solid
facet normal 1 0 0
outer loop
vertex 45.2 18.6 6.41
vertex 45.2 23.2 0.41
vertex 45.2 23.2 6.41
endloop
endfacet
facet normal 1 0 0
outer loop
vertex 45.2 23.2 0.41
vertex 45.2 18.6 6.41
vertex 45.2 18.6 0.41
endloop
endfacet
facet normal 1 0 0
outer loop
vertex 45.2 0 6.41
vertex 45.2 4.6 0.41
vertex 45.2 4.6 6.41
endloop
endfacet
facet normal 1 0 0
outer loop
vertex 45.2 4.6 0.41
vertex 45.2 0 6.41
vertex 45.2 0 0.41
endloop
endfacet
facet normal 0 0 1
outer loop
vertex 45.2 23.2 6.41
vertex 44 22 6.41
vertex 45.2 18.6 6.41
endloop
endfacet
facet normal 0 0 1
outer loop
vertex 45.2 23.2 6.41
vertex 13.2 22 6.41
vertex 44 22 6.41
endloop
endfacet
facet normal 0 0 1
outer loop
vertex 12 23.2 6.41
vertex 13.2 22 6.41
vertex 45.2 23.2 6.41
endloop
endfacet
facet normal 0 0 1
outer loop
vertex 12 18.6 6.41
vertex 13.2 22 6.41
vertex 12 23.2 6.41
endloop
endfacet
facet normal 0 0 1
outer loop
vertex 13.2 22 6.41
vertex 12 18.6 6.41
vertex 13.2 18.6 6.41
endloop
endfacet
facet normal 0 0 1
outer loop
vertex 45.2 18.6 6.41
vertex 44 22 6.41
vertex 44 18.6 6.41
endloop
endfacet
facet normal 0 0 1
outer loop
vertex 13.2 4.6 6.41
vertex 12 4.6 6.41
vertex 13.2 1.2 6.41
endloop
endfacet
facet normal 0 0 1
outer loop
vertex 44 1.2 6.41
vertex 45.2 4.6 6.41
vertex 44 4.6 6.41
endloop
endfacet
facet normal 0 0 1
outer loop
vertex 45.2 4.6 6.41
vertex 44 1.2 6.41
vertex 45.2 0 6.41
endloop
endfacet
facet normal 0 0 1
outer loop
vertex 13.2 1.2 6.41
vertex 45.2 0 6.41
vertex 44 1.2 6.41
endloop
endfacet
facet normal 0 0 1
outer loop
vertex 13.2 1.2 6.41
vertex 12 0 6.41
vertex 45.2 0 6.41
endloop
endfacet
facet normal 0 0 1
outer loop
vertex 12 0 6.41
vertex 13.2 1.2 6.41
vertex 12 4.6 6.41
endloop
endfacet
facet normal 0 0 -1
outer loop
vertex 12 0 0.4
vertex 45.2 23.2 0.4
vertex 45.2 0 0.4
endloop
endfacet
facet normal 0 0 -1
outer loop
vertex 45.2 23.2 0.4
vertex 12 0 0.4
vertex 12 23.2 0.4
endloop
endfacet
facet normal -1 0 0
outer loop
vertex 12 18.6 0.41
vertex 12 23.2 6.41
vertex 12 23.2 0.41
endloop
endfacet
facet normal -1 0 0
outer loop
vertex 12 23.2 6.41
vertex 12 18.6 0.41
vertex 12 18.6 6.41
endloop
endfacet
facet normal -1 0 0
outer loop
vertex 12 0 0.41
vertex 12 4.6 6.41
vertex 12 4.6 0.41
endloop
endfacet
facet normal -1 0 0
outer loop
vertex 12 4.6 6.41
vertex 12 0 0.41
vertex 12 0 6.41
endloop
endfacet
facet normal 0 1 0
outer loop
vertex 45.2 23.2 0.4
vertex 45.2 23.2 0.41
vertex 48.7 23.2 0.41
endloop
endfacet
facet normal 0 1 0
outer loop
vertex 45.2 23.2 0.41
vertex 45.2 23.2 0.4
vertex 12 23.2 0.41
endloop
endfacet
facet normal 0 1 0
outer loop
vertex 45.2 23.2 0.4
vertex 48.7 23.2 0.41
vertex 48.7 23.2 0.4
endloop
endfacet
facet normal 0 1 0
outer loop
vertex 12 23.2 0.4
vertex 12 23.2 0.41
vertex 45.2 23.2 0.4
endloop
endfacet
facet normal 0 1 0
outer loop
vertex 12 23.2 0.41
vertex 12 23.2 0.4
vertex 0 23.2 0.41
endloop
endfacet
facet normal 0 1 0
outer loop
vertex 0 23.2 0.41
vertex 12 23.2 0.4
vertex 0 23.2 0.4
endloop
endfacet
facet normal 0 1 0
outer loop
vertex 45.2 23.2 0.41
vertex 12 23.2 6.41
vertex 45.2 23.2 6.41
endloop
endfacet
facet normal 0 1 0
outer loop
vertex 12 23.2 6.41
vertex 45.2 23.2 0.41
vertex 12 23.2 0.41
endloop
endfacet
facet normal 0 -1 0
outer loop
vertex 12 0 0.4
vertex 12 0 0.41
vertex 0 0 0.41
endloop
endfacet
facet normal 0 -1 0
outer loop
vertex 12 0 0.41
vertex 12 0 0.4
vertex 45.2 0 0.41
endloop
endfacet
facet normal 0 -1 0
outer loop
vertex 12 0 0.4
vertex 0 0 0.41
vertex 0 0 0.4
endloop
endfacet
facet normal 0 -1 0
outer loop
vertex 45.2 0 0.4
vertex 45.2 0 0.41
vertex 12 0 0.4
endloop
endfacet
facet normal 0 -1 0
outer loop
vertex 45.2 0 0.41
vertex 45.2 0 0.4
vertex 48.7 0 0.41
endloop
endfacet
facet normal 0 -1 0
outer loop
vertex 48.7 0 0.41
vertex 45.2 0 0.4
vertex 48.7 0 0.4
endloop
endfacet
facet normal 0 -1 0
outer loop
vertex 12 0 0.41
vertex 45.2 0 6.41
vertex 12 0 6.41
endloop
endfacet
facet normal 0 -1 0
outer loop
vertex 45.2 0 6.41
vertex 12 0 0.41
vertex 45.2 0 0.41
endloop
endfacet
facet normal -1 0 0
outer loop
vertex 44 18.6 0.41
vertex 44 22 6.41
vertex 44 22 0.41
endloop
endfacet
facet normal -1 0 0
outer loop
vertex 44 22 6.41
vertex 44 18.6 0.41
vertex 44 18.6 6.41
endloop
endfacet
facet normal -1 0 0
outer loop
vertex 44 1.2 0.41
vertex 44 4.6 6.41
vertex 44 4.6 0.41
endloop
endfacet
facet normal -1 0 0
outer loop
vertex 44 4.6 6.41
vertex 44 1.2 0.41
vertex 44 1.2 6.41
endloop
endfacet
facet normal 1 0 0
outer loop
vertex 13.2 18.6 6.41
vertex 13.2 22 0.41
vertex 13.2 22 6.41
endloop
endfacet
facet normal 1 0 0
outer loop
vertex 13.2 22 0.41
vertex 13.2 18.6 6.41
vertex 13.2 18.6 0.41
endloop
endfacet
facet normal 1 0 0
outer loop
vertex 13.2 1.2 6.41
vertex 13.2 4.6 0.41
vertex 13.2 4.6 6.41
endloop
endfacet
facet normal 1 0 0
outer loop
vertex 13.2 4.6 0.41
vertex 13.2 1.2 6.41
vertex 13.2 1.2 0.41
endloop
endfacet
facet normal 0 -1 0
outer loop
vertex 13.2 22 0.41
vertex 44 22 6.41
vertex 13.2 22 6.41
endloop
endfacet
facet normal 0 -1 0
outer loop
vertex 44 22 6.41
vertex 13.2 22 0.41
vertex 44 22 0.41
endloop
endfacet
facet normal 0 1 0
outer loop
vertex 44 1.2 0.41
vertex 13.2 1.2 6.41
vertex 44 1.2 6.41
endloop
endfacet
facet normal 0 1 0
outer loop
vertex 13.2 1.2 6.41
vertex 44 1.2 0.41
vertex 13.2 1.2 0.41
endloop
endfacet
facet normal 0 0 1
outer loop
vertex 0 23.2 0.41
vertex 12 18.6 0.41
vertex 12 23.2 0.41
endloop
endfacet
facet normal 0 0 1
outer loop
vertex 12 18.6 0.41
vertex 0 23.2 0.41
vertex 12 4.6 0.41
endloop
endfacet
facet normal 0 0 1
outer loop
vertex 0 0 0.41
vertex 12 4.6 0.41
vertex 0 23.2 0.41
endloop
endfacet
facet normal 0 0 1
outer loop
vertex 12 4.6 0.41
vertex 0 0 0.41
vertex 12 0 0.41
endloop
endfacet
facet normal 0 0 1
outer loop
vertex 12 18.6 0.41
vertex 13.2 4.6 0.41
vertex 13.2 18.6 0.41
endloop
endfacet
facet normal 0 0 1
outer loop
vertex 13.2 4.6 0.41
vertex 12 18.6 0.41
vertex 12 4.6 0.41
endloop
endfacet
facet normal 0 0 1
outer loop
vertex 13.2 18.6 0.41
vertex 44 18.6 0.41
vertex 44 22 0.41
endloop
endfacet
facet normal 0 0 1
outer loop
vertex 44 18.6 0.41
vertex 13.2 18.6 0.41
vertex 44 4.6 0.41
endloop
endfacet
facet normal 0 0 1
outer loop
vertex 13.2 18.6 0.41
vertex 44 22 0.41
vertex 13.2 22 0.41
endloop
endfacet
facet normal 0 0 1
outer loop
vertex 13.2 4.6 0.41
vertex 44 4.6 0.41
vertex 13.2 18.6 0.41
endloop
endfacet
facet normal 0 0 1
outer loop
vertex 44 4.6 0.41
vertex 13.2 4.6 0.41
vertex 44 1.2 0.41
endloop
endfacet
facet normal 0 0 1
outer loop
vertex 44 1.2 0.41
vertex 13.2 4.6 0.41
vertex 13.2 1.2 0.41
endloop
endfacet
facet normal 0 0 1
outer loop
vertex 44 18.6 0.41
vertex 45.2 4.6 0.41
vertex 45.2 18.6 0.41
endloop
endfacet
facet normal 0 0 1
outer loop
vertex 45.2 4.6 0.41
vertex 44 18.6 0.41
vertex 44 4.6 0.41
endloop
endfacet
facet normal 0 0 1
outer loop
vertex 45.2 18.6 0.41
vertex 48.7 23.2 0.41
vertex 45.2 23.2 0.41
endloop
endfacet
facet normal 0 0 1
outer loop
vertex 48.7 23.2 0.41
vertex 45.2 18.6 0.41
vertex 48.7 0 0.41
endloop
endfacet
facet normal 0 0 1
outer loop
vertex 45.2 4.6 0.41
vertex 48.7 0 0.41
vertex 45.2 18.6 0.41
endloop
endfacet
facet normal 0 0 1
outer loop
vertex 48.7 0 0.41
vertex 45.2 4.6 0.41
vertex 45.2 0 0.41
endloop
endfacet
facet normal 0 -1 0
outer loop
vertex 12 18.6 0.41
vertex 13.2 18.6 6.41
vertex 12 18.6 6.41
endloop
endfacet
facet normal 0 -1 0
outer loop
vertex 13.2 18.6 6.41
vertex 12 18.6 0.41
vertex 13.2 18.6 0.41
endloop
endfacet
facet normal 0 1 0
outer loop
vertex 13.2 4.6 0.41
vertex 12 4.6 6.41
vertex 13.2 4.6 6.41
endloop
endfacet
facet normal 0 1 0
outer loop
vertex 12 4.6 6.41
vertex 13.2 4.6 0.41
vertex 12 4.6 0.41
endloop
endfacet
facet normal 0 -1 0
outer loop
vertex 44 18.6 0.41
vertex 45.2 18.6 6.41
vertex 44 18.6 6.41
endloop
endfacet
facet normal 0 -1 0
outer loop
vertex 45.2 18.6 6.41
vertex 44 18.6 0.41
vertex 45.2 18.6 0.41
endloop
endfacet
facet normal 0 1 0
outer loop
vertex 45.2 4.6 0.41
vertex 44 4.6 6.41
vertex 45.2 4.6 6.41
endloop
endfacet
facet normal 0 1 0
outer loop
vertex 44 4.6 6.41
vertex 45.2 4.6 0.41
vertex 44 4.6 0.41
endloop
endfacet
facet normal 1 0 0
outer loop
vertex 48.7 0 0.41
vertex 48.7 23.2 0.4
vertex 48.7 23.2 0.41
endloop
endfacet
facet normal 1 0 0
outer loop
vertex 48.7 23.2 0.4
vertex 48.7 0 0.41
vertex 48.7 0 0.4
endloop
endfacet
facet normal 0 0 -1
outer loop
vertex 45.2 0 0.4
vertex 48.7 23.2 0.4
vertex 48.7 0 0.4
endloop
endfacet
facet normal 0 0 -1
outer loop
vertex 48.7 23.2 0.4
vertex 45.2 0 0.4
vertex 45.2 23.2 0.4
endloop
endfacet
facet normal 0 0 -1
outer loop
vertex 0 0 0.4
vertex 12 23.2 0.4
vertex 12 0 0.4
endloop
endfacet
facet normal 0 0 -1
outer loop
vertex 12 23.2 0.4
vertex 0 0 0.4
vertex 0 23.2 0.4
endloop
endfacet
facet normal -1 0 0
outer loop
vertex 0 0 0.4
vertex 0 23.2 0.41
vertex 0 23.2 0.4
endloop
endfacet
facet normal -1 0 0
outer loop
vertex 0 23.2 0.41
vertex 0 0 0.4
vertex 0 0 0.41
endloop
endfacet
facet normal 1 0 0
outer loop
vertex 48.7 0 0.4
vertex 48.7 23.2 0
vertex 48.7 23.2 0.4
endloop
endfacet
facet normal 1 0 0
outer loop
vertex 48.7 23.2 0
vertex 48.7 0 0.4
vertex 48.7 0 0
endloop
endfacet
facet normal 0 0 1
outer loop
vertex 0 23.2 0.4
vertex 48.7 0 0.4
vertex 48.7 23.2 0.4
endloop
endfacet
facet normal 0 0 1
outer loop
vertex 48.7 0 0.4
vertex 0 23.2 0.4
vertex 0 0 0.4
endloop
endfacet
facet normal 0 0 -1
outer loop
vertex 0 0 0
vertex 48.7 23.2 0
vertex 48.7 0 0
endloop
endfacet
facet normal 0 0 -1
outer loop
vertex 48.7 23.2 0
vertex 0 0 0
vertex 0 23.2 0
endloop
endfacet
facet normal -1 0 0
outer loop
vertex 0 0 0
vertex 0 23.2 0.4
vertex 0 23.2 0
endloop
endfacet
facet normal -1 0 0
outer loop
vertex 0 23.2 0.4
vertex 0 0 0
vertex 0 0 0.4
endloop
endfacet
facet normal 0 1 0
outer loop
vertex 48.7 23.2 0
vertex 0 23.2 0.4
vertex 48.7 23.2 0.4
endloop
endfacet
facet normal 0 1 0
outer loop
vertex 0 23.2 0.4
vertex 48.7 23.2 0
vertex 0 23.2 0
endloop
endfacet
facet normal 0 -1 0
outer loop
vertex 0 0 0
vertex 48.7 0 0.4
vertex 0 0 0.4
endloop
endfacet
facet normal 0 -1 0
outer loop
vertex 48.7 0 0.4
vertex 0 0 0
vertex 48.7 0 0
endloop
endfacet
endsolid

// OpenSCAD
// file: ../../Base/Boxes.scad
// Fischertechnik Box Foundation
// Pre-designed Boxes

use <Constants.scad>

include <PlacementOptions.scad>

box190Width = 190;
box190Depth = 130;
box130Width = 130;
box130Depth = 95;

// Values are from an original ec3 box
topBottomDifference = 1.5;
outerHeight = 40;
baseThickness = 1.8;
innerHeight = outerHeight - baseThickness;
stackExcess = 5.7;
radius = 3.5;
wallThickness = 1.5;
tolerance = 0.2;

boxWallThickness = wallThickness;
boxBaseThickness = baseThickness;
boxWebWidth = 3.0;

// getBoxWallThickness()
// Gets the wall thickness of a Fischertechnik Box
function getBoxWallThickness() = boxWallThickness;

// getBoxUsageHeight(height = 38.2)
// Gets the usable height of a Fischertechnik box
// height = Outer height of the box from the bottom to the upper edge.
function getBoxUsageHeight(height = outerHeight) = height - baseThickness - stackExcess;

// getBoxInnerHeight()
// Gets the inner height of a Fischertechnik box, including the stack excess
function getBoxInnerHeight() = innerHeight;

// getBoxBaseThickness()
// Gets the thickness of the Fischertechnik box base.
function getBoxBaseThickness() = boxBaseThickness;

// getBoxWebWidth()
// Gets the width of a box web
function getBoxWebWidth() = boxWebWidth;

// getBox190Space()
// Gets the usable inner space of a Box 190 as an x/y-list
function getBox190Space() = [
    box190Width - 2*getBoxWallThickness() - topBottomDifference, 
    box190Depth - 2*getBoxWallThickness() - topBottomDifference ];

// RoundedCornerPlate(width, depth, height, radius)
// Creates a body plate with rounded corners for a box. Used
// also to create the complete box with the hull module.
// width = Width of the plate
// depth = depth of the plate 
// height = thickness of the plate
// radius = radius of the rounded corner
module RoundedCornerPlate(width, depth, height, radius) {
    translate([radius, radius])
    hull() {
        w = width-2*radius;
        d = depth-2*radius;
        cube([w, d, height]);
        cylinder(height, r=radius, $fn=getFragments());
        translate([w, 0])
            cylinder(height, r=radius, $fn=getFragments());
        translate([w, d])
            cylinder(height, r=radius, $fn=getFragments());
        translate([0, d])
            cylinder(height, r=radius, $fn=getFragments());
    }
}

// BoxBase(width, depth)
// Creates an empty stackable Fischertechnik compatible box
// width = Outer width of the box (190, 130, ...)
// depth = Outer depth of the box (130, 95, ...)

module BoxBase(width, depth, height=outerHeight) {    
    thinPlate = 0.01;

    innerHeight = height - baseThickness;    
    
    module Body(tolerance=tolerance) {
        hull() {
            // Bottom with tolerance to fit into the original boxes when stacked
            translate([-wallThickness+tolerance, -wallThickness+tolerance, -baseThickness])
                RoundedCornerPlate(width-topBottomDifference-2*tolerance, depth-topBottomDifference-2*tolerance, thinPlate, radius);
            
            // Top
            translate([-wallThickness-topBottomDifference/2, -wallThickness-topBottomDifference/2, innerHeight-thinPlate])
                RoundedCornerPlate(width, depth, thinPlate, radius);
         }
    }

    module Cutoff() {
        hull() {
            coWidth = width - 2*wallThickness;
            coDepth = depth - 2*wallThickness;
            
            // Bottom
            RoundedCornerPlate(coWidth-topBottomDifference, coDepth-topBottomDifference, thinPlate, radius);

            // Top
            translate([-topBottomDifference/2, -topBottomDifference/2, innerHeight+thinPlate]) 
                RoundedCornerPlate(coWidth, coDepth, thinPlate, radius);
        }
    }
    
    difference() {        
        Body();
        Cutoff();
        stackOffset = innerHeight - stackExcess;
        translate([0, 0, stackOffset + baseThickness])
            Body(tolerance=0);
    }
}

// Creates the Fischertechnik empty box 130x190 mm and places it at position 0,0
// 190x130 are the outer sizes, the inner space is slightly smaller. Use getBox190Space() to get the inner sizes.
// The box is positioned that the usable inner space is at the 0,0,0 position.

module Box190() {
    BoxBase(box190Width, box190Depth);
}

// Gets the usable inner space of a Box 130 as an x/y-list
function getBox130Space() = [
    box130Width - 2*getBoxWallThickness() - topBottomDifference, 
    box130Depth - 2*getBoxWallThickness() - topBottomDifference ];

// Creates the Fischertechnik empty box 95x130 mm and places it at position 0,0
// 190x130 are the outer sizes, the inner space is slightly smaller. Use getBox190Space() to get the inner sizes.
// The box is positioned that the usable inner space is at the 0,0,0 position.

module Box130() {
    BoxBase(box130Width, box130Depth);
}

// Creates a web at the specified box walls
// corner 0 = LowerLeft, 1 = UpperLeft, 2 = UpperRight, 3 = LowerRight
// side 0 = LeftOfCorner, 1 = RightOfCorner
// distance = Distance in mm from the corner
// boxSpace = inner width and depth of the box (default: Box 190)
// webWidth = length of the web (default is 3 mms)
// webThickness = thickness of the web (default is 1 mm)
// height = Height of the web (standard is getBoxUsageHeight())

module BoxWeb(corner, side, distance, boxSpace=getBox190Space(), webWidth=getBoxWebWidth(), webThickness=1.0, height=getBoxUsageHeight()) {
    sink = getBoxWallThickness()/2;

    width = (corner % 2 == 0) ? 
            (side == LeftOfCorner ? webWidth : webThickness) :
            (side == LeftOfCorner ? webThickness : webWidth);

    depth = (corner % 2 == 0) ? 
            (side == RightOfCorner ? webWidth : webThickness) :
            (side == RightOfCorner ? webThickness : webWidth);
    
    xDiff = corner == LowerLeft ? 
                (side == LeftOfCorner ? -sink : distance) :
            (corner == UpperLeft ?                
                (side == LeftOfCorner ? distance : -sink) :
            (corner == UpperRight ?
                (side == LeftOfCorner ? boxSpace.x-webWidth+sink : boxSpace.x-distance-webThickness) :
                (side == LeftOfCorner ? boxSpace.x-distance-webThickness: boxSpace.x-webWidth+sink)));

    yDiff = corner == LowerLeft ? 
                (side == RightOfCorner ? -sink : distance) :
            (corner == UpperLeft ?
                (side == RightOfCorner ? boxSpace.y-distance-webThickness : boxSpace.y-webWidth+sink) :
            (corner == UpperRight ?
                (side == RightOfCorner ? boxSpace.y-webWidth+sink : boxSpace.y-distance-webThickness) :
                (side == RightOfCorner ? distance : -sink)));
    
    translate([xDiff, yDiff, -getExcess()])
        cube([width, depth, height + 2*getExcess()]);
}
// file: ../../Base/Rotation.scad
// Fischertechnik Box Foundation
// Geometry Helpers Rotation

include <PlacementOptions.scad>

// getRotatedSpace(space, rotation=NoRotation)
// Rotates the space dependent on the specified rotation

function getRotatedSpace(space, rotation=NoRotation) = [
    (rotation == Rotate90 || rotation == Rotate270) ? space.y : space.x,
    (rotation == Rotate90 || rotation == Rotate270) ? space.x : space.y
];

// Rotates the given space around the fixed left lower corner
// space = the space the children needs as width/depth list [width,depth]
// rotation = 0 Rotate0 degrees, 1 Rotate90 degrees, 2 Rotate180 degrees, 3 Rotate270 degrees (equivalent to -90)

module RotateFix(space, rotation=NoRotation) {
    dy = (rotation == Rotate0 || rotation == Rotate270) ? 0 :
        (rotation == Rotate90) ? space.x :
        space.y;
    dx = (rotation < Rotate180) ? 0 :
        (rotation == Rotate180) ? space.x :
        space.y;
    
    translate([dx, dy, 0])
        rotate([0, 0, rotations[rotation]])
            children();
}
// file: ../../Base/Alignment.scad
// Fischertechnik Box Foundation
// Geometry Helpers Alignment

include <PlacementOptions.scad>

// getAlignedX(elementWidth, spaceWidth, align=AlignRight, offset=0)
// Gets the aligned X offset of an element with the given
// width in the given space.
// elementWidth = The width of the element to positon
// spaceWidth = The space where the element should be aligned
// align = 0 AlignLeft, 1 AlignCenter, 2 AlignRight
// offset = an optional offset from the aligned position. When
// aligned left or centered, then positive values are in X direction.
// When aligned right then positive values are in negative X direction.

function getAlignedX(elementWidth, spaceWidth, align=AlignRight, offset=0) =
    (align == AlignLeft) ?
        offset :
        ((align == AlignCenter) ?
        (spaceWidth - elementWidth)/2 + offset :
        spaceWidth - offset - elementWidth);

// getAlignedY(elementDepth, spaceDepth, align=AlignTop, offset=0)
// Gets the aligned Y offset of an element with the given
// depth in the given space.
// elementDepth = The depth of the element to positon
// spaceDepth = The space where the element should be aligned
// align = 0 AlignBottom, 1 AlignCenter, 2 AlignTop
// offset = an optional offset from the aligned position. When
// aligned bottom or centered, then positive values are in Y direction.
// When aligned top then positive values are in negative Y direction.

function getAlignedY(elementDepth, spaceDepth, align=AlignTop, offset=0) =
    (align == AlignBottom) ?
        offset :
        ((align == AlignCenter) ?
        (spaceDepth - elementDepth)/2 + offset :
        spaceDepth - offset - elementDepth);
// file: ../../Base/PlacementOptions.scad
// Fischertechnik Box Foundation
// Placement Options

// Alignment
NoAlign = 0;
AlignLeft = 1;
AlignBottom = 2;
AlignCenter = 3;
AlignRight = 4;
AlignTop = 5;

// Element rotation degree steps
rotations = [0, -90, -180, -270];

// Rotation
NoRotation = 0;
Rotate0 = 0;
Rotate90 = 1;
Rotate180 = 2;
Rotate270 = 3;

// Docking (seen from above)
NoDock = -1;
DockLeft = 0;
DockTop = 1;
DockRight = 2;
DockCorner = 2;
DockBottom = 3;

// Web corners
LowerLeft = 0;
UpperLeft = 1;
UpperRight = 2;
LowerRight = 3;

// Web position relative to corner
LeftOfCorner = 0;
RightOfCorner = 1;
// file: ../../Base/Placement.scad
// Fischertechnik Box Foundation
// Geometry Helpers Placement

use <Constants.scad>
use <Alignment.scad>
use <Rotation.scad>
use <Boxes.scad>

include <PlacementOptions.scad>

// Place(x=0, y=0, elementSpace=[0,0], alignX=AlignLeft, alignY=AlignBottom, rotation=Rotate0, boxSpace=getBox190Space())
// Places the child at the specified position
// y = Y-Position. This is a relative position when an X aligment is specified.
// x = X-Position. This is a relative position when an Y aligment is specified.
// elementSpace = space of the element to be placed [x,y]
// alignX = -1=NoAlign, 0 AlignLeft, 1 AlignCenter, 3 AlignRight (elementSpace and boxSpace required!)
// alignY = -1=NoAlign, 2 AlignBottom, 1 AlignCenter, 4 AlignTop (elementSpace and boxSpace required!)
// rotation = 0 Rotate0 0 degrees, 1 Rotate90 90 degrees, 
// 2 Rotate180 180 degrees, 3 Rotate270 270 degrees (equivalent to -90)
// boxSpace = Inner space of the box where the placement occurs [x,y] - default is Box 190x130 inner space

module Place(x=0, y=0, elementSpace=[0,0], 
  alignX=AlignLeft, alignY=AlignBottom, 
  rotation=NoRotation, boxSpace=getBox190Space()) {

    module Position(x, y, space, rotation=Rotate0) {
        translate([x, y, 0])
            RotateFix(space, rotation)
                children();
    }

    space = getRotatedSpace(elementSpace, rotation);
    alignedX = getAlignedX(space.x, boxSpace.x, alignX, x);
    alignedY = getAlignedY(space.y, boxSpace.y, alignY, y);
    Position(alignedX, alignedY, elementSpace, rotation)
        children();
}

// Center(space=getBox130Space(), elementSpace=[0,0])
// space = Space where the children is centered. For cylinder use centered=true and no elementSpace.
// elementSpace = space of the element to be centered [x,y]

module Center(space=getBox190Space(), elementSpace=[0,0]) {
    Place(elementSpace=elementSpace, boxSpace=space, alignX=AlignCenter, alignY=AlignCenter)
        children();
}

// CenterHorizontal(width=0, y=0, offset=0, space=getBox130Space())
// width = Width of the element to be placed.
// y = Y position of the element
// offset = Offset from the center position (negative will be left of the center)
// space = Space where the element is placed

module CenterHorizontal(width=0, y=0, offset=0, space=getBox190Space()) {
    Place(x=offset, y=y, elementSpace=[width, 0], boxSpace=space, alignX=AlignCenter)
        children(0);
}

// CenterVertical(depth=0, x=0, offset=0, space=getBox130Space())
// depth = Depth of the element to be placed.
// x = X position of the element
// offset = Offset from the center position (negative will be down of the center)
// space = Space where the element is placed

module CenterVertical(depth=0, x=0, offset=0, space=getBox190Space()) {
    Place(x=x, y=offset, elementSpace=[0, depth], boxSpace=space, alignY=AlignCenter)
        children(0);
}

// getIsVertical(align)
// True if the specified alignment needs a vertical orientation for a divider (AlignRight, AlignLeft)

function getIsVertical(align) = (align == AlignRight || align == AlignLeft);

// getIsHorizontal(align)
// True if the specified alignment needs a horizontal orientation for a divider (AlignTop, AlignBottom)

function getIsHorizontal(align) = (align == AlignTop || align == AlignBottom);
// file: ../../Elements/AxisClip10.scad
// Fischertechnik Box Library
// Axis for clip 10
// 31023

use <../ModelBase/Simple.scad>
use <../Base/Constants.scad>

/* [Element Parameters] */
height = 23;
clipHeight = 10;

/* [Hidden] */
width = 12;
depth = 12;
upperDiameter = 3.6;

// getAxisClip10Space()
// Gets the space of a n axis for a clip 10 with spring ring (mot2)

function getAxisClip10Space() = [width, depth, height];

// AxisClip10(height, clipHeight)
// Axis for clip 10 with spring ring (mot2)
// height = Height of the complete axis (standard is 23, in mot3 its only 12)
// clipHeight = Height of the part for the clip (standard is 10, in mot3 its only 7)

module AxisClip10(height=height, clipHeight=clipHeight) {
    LeveledAxisWithSpace(height, height-clipHeight, getAxisClip10Space(), diameter=upperDiameter);
}

// Test
color("lightgray")
AxisClip10(height, clipHeight);
// file: ../../Base/Constants.scad
// Fischertechnik Box Foundation
// Constants

// Constant values necessary for multiple elements

// Base constants
dividerThickness = 1.2;
excess = 0.01;
fragments = 90;
tolerance = 0.8;

// Gets the thickness of a divider 
function getDividerThickness() = dividerThickness;

// Gets the excess that is used to merge walls into each other
function getExcess() = excess;

// Gets amount of fragments of a cylinder
function getFragments() = fragments;

// Gets the inner tolerance of a frame to each side
function getTolerance() = tolerance;


// Fischertechnik specific constants
axisDiameter = 4;
axisBottomDiameter = axisDiameter + 1;
axisTolerance = 0.2;

// Gets axis diameter of Fischertechnik axis
function getAxisDiameter() = axisDiameter;

// Gets axis diameter tolerance (subtracted for element axis)
function getAxisTolerance() = axisTolerance;

// Gets the axis diameter for standing axis
function getStandAxisDiameter() = getAxisDiameter() - getAxisTolerance();

// Gets axis bottom diameter for thicker part at the bottom
function getAxisBottomDiameter() = axisBottomDiameter;

standardEdgeDistance = 2.5;
standardWebDistance = 11.5;
standardCornerLength = 15;

// gets the standard distance to the wall of the box for dockable frames with webs
function getStandardEdgeDistance() = standardEdgeDistance;

// gets the standard distance of each web to the corner of the dockable frame
function getStandardWebDistance() = standardWebDistance;

// gets the standard length of the corner walls of a dockable frame
function getStandardCornerLength() = standardCornerLength;

tubeWallFactor = 0.8;

// gets the wall thickness of a tube.
function getTubeWallThickness() = tubeWallFactor * getDividerThickness();

smallPartsFrameHeight = 20;

// gets the frame height for docked small parts boxes.
function getSmallPartsFrameHeight() = smallPartsFrameHeight;

hubRingDiameter = 19.5;
hubRingLevelDiameter = 21;

// gets the diameter of a tube matching the inner ring of a wheel
function getHubRingDiameter() = hubRingDiameter;

// gets the diameter of a hub tube with a thicker diameter
function getHubRingLevelDiameter() = hubRingLevelDiameter;
// file: ../../Elements/FrameMiniMotor.scad
// Fischertechnik Box Library
// Frame for mini-motor
// 31062, 137096

use <../Base/Constants.scad>
use <../Base/Placement.scad>
use <../ModelBase/Simple.scad>

include <../Base/PlacementOptions.scad>

/* [Hidden] */
width = 30;
depth = 20;
height = 6;
pinDepth = 3.5;
wormDepth = 12;

volume = [width, depth, height];

// getFrameMiniMotorSpace()
// Gets the space for a mini motor including the pin and the worm

function getFrameMiniMotorSpace() = getFrameOuterVolume([width + pinDepth + wormDepth, depth, height]);

// FrameMiniMotor()
// Frame for mini motor

module FrameMiniMotor() {
    Space(getFrameMiniMotorSpace());
    translate([wormDepth, 0]) {
        difference() {
            Frame([width, depth, height]);
            cutoff = 14;
            cutoffVolume = [2*getDividerThickness(), cutoff, height + getExcess()];
            translate([-getDividerThickness()/2, (getFrameOuterVolume(volume).y - cutoff)/2])
                cube(cutoffVolume);
            translate([getFrameOuterVolume(volume).x - getDividerThickness() - getDividerThickness()/2, (getFrameOuterVolume(volume).y - cutoff)/2])
                cube(cutoffVolume);
        }
    }
}

// test
color("lightgray")
FrameMiniMotor();
// file: ../TestPrint.scad
// 3D Print Test Base

use <../Base/Constants.scad>

use <../Elements/AxisClip10.scad>

module TestPrint(elementSpace) {
    cube([elementSpace.x, elementSpace.y, 0.4]);
    translate([0,0,0.4+getExcess()]) {
        children();
    }
}

TestPrint(getAxisClip10Space())
    AxisClip10();
// main file
// 3D Print Test
// FrameMiniMotor

use <../TestPrint.scad>
use <../../Elements/FrameMiniMotor.scad>

TestPrint(getFrameMiniMotorSpace())
    FrameMiniMotor();
